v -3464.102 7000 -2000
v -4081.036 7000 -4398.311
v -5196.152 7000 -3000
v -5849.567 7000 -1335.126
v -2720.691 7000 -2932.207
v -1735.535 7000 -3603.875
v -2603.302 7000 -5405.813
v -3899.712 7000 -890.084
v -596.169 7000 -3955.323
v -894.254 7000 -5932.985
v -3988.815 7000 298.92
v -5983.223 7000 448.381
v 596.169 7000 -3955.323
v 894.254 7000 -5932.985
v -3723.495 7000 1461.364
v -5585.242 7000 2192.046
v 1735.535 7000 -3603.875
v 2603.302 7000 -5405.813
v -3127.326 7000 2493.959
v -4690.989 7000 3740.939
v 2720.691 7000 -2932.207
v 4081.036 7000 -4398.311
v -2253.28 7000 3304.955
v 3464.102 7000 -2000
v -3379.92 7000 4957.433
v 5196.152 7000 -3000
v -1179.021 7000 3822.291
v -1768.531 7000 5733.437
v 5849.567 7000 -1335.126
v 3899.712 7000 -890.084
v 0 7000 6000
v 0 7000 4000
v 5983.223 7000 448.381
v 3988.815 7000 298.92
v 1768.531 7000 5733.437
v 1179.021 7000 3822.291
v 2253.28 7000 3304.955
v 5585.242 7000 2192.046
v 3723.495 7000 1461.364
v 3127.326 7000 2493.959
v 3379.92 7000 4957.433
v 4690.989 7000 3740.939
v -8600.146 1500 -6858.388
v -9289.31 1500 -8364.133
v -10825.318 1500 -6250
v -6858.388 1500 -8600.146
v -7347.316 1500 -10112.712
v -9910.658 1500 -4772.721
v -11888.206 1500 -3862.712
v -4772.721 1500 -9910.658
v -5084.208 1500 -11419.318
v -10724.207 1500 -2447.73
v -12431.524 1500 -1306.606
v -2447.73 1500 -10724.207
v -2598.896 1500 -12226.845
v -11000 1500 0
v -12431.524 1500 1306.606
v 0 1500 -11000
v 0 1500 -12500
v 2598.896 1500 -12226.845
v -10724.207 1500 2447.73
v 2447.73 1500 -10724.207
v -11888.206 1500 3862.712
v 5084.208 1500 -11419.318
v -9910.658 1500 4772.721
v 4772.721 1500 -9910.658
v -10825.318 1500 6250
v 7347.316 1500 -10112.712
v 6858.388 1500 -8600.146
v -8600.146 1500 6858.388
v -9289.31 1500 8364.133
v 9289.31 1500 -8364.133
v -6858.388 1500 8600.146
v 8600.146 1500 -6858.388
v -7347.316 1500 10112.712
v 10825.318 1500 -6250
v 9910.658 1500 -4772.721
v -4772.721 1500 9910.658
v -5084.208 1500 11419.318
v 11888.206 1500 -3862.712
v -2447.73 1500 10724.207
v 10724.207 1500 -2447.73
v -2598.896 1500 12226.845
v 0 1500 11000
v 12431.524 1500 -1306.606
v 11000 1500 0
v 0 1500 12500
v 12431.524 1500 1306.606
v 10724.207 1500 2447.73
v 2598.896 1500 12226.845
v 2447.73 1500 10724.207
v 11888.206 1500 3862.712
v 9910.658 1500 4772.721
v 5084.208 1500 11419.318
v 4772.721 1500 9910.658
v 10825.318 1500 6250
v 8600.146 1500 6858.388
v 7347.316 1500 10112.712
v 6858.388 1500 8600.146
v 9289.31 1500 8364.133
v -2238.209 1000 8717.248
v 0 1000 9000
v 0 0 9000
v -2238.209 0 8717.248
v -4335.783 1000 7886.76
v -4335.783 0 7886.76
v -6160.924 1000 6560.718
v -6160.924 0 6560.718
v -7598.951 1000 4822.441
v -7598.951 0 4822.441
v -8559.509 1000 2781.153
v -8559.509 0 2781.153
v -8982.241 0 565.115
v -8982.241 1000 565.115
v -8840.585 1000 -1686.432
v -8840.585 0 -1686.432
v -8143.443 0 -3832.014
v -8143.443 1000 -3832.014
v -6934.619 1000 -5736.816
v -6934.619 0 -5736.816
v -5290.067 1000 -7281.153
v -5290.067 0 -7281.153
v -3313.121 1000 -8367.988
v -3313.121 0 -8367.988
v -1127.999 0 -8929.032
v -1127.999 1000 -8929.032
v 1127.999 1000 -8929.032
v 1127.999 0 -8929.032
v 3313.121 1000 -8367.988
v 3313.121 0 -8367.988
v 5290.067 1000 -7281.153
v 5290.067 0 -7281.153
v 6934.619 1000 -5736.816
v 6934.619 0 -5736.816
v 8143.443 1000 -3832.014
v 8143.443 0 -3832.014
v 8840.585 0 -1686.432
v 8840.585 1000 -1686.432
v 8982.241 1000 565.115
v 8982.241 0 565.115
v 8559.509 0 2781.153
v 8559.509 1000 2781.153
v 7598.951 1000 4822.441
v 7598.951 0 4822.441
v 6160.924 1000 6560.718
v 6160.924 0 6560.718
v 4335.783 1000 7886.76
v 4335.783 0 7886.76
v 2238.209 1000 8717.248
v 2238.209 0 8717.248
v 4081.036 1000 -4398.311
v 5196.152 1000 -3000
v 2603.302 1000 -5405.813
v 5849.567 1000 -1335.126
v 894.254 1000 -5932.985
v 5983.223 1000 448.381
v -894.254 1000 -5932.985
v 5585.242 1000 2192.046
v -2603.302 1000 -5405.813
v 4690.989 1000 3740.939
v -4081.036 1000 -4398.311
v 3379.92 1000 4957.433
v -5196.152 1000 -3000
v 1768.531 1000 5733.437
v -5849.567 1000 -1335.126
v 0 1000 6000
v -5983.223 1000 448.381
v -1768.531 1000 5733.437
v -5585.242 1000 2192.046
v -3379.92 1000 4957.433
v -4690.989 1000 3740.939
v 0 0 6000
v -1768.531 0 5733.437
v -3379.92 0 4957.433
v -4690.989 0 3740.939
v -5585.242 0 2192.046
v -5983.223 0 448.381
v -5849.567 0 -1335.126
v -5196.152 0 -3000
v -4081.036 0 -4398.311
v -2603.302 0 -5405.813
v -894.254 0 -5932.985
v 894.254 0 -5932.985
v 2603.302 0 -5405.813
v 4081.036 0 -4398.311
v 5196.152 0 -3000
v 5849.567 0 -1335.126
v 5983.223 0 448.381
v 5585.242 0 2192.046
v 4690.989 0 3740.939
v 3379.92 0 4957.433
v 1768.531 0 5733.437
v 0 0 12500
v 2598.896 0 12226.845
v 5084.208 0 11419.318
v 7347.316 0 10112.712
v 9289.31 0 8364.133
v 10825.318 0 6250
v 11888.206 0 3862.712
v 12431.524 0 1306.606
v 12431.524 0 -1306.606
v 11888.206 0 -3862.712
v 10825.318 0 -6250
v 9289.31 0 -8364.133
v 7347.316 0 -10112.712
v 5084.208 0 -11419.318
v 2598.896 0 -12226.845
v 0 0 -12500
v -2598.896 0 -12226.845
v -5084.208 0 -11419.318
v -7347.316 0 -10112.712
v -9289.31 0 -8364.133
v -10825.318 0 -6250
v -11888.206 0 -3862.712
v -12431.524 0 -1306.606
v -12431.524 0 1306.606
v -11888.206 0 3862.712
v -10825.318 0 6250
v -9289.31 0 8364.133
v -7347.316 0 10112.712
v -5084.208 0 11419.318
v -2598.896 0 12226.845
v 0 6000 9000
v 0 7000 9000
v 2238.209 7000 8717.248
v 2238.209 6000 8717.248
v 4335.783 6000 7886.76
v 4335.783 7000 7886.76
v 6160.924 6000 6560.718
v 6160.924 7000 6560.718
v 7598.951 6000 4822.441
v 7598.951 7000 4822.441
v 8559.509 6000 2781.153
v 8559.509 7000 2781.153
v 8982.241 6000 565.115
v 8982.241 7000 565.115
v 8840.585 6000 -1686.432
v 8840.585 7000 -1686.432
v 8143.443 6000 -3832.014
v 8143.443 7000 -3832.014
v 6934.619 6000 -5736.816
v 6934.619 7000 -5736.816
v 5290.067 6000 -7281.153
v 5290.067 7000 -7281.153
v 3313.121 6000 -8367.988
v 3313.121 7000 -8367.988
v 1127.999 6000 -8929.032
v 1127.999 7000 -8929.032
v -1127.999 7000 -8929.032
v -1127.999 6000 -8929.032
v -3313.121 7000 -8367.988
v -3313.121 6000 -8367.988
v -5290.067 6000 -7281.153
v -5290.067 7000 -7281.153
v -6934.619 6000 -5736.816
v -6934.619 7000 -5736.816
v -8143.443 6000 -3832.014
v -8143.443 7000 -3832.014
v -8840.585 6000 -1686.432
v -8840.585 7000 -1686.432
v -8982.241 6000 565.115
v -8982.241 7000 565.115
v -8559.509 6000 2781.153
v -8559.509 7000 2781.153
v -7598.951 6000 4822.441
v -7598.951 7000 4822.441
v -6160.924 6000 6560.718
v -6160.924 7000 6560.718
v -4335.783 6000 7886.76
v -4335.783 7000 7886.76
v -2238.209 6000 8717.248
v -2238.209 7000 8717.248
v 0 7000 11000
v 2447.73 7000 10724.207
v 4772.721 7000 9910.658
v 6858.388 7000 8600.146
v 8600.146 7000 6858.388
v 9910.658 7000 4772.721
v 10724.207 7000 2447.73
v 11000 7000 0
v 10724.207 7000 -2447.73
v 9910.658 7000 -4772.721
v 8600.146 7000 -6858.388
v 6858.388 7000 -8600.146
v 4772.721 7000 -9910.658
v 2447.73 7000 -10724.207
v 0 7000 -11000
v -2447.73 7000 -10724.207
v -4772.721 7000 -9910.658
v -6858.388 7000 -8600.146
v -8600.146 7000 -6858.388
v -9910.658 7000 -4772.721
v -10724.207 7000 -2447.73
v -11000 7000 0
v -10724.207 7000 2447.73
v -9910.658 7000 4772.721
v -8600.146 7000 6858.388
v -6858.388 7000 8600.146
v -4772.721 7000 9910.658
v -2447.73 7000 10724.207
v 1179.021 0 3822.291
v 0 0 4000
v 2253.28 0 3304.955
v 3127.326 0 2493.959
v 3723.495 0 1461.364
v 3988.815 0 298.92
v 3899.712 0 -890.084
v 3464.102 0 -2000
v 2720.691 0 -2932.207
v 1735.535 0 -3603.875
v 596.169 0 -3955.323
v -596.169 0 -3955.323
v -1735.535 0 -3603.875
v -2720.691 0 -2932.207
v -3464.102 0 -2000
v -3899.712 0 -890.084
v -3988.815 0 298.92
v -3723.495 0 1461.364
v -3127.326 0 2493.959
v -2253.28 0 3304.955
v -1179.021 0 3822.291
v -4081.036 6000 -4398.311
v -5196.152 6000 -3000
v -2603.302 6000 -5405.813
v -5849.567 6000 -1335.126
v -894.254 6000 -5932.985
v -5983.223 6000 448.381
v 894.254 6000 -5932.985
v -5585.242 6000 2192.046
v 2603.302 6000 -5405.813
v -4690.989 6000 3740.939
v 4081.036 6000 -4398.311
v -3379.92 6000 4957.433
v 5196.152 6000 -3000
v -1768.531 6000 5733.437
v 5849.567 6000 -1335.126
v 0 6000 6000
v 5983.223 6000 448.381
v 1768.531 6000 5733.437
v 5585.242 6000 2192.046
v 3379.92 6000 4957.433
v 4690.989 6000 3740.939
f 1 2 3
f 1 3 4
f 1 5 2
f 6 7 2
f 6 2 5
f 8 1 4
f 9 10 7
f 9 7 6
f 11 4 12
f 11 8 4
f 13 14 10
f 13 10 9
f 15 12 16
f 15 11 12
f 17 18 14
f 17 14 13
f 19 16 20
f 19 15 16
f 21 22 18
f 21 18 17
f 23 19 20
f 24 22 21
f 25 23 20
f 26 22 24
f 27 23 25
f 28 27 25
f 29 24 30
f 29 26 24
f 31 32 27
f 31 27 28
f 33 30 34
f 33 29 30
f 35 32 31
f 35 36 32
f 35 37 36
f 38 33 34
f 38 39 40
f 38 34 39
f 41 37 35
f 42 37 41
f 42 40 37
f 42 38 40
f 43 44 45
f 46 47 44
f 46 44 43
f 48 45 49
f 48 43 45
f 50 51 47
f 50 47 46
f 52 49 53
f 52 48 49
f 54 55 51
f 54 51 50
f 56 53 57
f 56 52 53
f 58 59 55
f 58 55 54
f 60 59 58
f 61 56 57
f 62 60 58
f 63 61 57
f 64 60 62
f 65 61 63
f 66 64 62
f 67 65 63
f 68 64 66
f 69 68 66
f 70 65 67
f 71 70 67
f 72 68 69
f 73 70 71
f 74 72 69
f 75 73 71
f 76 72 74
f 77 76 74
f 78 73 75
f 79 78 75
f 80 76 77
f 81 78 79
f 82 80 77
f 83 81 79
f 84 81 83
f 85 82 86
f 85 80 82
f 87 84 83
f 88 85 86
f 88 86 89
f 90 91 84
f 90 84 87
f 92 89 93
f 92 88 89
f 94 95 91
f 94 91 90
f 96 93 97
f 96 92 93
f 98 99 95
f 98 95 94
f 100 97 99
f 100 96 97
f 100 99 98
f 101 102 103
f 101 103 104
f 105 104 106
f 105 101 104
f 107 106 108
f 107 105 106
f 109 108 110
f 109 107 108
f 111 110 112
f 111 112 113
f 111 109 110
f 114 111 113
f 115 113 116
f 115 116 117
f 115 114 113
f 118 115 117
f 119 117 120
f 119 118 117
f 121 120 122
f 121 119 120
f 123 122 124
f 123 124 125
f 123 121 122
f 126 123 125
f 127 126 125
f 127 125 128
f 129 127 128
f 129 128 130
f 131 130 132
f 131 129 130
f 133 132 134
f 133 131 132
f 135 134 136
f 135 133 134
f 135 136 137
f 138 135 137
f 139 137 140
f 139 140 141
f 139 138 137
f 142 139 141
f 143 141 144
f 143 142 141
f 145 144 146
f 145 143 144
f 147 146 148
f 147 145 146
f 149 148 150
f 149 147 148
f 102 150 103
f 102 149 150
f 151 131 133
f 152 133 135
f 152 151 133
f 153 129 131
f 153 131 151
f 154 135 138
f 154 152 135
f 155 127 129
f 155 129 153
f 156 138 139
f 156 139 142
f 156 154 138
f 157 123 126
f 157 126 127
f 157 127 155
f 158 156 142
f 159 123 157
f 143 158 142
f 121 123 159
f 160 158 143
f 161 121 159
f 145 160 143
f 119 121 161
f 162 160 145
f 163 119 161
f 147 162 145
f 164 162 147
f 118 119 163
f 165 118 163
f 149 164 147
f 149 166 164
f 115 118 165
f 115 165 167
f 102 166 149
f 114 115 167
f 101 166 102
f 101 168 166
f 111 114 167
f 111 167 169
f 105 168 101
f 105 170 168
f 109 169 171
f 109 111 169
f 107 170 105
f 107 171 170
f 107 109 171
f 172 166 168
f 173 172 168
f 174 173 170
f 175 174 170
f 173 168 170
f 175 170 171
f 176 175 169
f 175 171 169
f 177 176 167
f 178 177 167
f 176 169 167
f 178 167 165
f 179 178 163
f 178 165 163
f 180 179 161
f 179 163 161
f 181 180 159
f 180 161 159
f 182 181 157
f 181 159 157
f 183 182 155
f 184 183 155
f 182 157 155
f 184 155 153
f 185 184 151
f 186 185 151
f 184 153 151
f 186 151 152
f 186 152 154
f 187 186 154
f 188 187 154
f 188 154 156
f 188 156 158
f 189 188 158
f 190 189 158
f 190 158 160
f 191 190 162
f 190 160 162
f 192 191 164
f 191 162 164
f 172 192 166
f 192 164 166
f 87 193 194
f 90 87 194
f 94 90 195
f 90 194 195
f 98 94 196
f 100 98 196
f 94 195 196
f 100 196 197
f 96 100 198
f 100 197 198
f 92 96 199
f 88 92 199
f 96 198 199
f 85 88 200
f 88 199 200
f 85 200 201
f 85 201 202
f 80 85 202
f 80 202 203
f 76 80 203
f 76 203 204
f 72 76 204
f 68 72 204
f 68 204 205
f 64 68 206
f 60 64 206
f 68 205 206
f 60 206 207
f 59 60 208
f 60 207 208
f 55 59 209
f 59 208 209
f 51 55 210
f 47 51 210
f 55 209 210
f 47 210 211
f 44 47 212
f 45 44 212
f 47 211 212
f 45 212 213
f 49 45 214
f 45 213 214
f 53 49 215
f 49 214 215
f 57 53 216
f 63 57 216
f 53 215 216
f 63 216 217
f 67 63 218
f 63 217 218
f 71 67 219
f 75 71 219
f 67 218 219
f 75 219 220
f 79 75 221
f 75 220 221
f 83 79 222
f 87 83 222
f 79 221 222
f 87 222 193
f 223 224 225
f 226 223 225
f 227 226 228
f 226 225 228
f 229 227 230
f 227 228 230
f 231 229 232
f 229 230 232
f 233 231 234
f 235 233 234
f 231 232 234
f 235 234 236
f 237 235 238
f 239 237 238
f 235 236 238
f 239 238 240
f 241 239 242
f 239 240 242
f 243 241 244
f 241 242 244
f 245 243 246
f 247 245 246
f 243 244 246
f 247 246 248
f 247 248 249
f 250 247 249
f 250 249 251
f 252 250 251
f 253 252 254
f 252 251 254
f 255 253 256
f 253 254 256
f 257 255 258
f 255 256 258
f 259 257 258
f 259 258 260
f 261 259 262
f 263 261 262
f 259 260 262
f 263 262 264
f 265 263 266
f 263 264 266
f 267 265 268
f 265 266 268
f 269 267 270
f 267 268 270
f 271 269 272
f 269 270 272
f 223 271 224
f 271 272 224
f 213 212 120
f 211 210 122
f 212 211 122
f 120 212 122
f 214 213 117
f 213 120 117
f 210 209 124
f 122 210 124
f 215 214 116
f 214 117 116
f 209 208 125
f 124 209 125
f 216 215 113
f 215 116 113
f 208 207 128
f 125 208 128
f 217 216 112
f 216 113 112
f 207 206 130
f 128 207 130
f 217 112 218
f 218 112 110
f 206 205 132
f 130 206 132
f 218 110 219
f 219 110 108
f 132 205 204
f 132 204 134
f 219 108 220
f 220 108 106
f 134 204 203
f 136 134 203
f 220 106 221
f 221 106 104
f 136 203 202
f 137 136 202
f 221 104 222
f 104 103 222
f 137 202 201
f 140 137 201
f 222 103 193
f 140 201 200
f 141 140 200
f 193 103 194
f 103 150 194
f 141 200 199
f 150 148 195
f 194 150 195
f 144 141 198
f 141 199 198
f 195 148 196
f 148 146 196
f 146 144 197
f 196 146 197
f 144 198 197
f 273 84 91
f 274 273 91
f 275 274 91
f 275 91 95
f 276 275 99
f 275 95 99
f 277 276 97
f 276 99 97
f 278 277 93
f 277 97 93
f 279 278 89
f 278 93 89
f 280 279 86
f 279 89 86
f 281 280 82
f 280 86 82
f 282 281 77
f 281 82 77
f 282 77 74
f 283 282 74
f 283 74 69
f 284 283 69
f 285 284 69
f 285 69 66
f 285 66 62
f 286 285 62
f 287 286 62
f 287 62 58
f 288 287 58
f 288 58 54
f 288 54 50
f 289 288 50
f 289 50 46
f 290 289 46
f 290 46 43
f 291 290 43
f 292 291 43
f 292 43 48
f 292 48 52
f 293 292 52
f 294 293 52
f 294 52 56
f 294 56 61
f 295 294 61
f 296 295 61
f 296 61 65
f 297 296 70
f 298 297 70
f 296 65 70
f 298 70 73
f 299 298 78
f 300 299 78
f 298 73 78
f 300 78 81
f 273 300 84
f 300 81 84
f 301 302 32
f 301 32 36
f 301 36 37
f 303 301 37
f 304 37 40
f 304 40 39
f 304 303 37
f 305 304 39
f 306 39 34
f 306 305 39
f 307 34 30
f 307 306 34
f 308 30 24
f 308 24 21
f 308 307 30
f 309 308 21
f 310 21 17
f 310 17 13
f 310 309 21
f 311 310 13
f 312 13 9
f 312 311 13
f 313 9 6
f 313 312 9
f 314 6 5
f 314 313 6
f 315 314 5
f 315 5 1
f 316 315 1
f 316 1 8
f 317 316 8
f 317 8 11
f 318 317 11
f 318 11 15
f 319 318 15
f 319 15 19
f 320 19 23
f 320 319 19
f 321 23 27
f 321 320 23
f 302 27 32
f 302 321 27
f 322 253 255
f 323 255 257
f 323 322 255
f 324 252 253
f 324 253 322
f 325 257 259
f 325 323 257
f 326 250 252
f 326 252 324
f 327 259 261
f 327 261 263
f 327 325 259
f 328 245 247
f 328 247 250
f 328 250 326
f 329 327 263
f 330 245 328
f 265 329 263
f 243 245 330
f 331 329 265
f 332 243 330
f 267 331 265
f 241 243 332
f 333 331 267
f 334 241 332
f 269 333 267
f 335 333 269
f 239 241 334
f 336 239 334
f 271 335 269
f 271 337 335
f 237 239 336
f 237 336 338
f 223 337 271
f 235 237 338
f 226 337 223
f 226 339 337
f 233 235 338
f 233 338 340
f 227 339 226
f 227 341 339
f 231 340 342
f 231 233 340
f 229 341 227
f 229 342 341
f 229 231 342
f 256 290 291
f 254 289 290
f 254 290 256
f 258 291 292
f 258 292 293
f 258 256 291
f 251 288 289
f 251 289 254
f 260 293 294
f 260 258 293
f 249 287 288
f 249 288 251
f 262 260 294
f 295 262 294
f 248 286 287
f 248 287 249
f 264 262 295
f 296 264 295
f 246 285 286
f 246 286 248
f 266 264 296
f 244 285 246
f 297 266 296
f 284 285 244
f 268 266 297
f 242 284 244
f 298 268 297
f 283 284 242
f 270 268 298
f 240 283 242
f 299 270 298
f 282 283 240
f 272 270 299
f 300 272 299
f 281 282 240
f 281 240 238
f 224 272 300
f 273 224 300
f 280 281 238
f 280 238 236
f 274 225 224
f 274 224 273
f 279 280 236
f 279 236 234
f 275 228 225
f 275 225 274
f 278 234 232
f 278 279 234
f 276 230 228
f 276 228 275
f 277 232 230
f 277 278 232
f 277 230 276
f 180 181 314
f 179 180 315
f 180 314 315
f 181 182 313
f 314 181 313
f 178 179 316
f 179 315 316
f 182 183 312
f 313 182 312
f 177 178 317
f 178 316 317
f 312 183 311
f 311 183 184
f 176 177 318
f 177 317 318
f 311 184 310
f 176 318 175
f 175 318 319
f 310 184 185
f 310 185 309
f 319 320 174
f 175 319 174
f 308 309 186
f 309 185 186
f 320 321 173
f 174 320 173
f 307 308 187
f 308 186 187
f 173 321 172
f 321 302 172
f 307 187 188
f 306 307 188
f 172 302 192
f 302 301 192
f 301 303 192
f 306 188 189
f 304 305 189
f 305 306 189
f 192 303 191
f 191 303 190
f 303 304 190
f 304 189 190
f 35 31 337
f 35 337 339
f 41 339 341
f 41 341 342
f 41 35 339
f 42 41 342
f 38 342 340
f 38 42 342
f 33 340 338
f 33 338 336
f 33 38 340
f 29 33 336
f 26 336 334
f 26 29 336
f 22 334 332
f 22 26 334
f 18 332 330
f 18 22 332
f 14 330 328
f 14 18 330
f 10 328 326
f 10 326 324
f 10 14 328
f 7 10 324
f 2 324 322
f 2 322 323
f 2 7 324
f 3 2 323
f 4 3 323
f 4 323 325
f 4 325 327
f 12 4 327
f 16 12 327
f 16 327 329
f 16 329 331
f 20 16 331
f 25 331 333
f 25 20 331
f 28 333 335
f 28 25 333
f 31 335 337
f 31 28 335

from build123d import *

# Parameters (mm, degrees)
SKETCH_1_R          = 11000
SKETCH_1_R_2        = 4000
EXTRUDE_1_DEPTH     = 7000
SKETCH_1_3_R        = 12500
SKETCH_1_3_R_2      = 11000
EXTRUDE_2_DEPTH     = 1500
SKETCH_2_R          = 9000
SKETCH_2_R_2        = 6000
CUT_EXTRUDE_1_DEPTH = 1000
CUT_EXTRUDE_START   = -1000
SKETCH_3_R          = 9000
SKETCH_3_R_2        = 6000
CUT_EXTRUDE_2_DEPTH = 1000


with BuildPart() as part:
    # 草圖1 → 填料-伸長1 (new body)
    with BuildSketch(Plane(origin=(0, 0, 0), x_dir=(1, 0, 0), z_dir=(0, 1, 0))):
        Circle(SKETCH_1_R)
        Circle(SKETCH_1_R_2, mode=Mode.SUBTRACT)
    extrude(amount=EXTRUDE_1_DEPTH)

    # 草圖1<3> → 填料-伸長2 (add)
    with BuildSketch(Plane(origin=(0, 0, 0), x_dir=(1, 0, 0), z_dir=(0, 1, 0))):
        Circle(SKETCH_1_3_R)
        Circle(SKETCH_1_3_R_2, mode=Mode.SUBTRACT)
    extrude(amount=EXTRUDE_2_DEPTH)

    # 草圖2 → 除料-伸長1 (cut)
    with BuildSketch(Plane(origin=(0, 7000, 0), x_dir=(1, 0, 0), z_dir=(0, 1, 0))):
        Circle(SKETCH_2_R)
        Circle(SKETCH_2_R_2, mode=Mode.SUBTRACT)
    extrude(amount=-CUT_EXTRUDE_1_DEPTH, mode=Mode.SUBTRACT)

    # 草圖3 → 除料-伸長2 (cut)
    with BuildSketch(Plane.XZ.offset(CUT_EXTRUDE_START)):
        Circle(SKETCH_3_R)
        Circle(SKETCH_3_R_2, mode=Mode.SUBTRACT)
    extrude(amount=CUT_EXTRUDE_2_DEPTH, mode=Mode.SUBTRACT)


solid = part.part
